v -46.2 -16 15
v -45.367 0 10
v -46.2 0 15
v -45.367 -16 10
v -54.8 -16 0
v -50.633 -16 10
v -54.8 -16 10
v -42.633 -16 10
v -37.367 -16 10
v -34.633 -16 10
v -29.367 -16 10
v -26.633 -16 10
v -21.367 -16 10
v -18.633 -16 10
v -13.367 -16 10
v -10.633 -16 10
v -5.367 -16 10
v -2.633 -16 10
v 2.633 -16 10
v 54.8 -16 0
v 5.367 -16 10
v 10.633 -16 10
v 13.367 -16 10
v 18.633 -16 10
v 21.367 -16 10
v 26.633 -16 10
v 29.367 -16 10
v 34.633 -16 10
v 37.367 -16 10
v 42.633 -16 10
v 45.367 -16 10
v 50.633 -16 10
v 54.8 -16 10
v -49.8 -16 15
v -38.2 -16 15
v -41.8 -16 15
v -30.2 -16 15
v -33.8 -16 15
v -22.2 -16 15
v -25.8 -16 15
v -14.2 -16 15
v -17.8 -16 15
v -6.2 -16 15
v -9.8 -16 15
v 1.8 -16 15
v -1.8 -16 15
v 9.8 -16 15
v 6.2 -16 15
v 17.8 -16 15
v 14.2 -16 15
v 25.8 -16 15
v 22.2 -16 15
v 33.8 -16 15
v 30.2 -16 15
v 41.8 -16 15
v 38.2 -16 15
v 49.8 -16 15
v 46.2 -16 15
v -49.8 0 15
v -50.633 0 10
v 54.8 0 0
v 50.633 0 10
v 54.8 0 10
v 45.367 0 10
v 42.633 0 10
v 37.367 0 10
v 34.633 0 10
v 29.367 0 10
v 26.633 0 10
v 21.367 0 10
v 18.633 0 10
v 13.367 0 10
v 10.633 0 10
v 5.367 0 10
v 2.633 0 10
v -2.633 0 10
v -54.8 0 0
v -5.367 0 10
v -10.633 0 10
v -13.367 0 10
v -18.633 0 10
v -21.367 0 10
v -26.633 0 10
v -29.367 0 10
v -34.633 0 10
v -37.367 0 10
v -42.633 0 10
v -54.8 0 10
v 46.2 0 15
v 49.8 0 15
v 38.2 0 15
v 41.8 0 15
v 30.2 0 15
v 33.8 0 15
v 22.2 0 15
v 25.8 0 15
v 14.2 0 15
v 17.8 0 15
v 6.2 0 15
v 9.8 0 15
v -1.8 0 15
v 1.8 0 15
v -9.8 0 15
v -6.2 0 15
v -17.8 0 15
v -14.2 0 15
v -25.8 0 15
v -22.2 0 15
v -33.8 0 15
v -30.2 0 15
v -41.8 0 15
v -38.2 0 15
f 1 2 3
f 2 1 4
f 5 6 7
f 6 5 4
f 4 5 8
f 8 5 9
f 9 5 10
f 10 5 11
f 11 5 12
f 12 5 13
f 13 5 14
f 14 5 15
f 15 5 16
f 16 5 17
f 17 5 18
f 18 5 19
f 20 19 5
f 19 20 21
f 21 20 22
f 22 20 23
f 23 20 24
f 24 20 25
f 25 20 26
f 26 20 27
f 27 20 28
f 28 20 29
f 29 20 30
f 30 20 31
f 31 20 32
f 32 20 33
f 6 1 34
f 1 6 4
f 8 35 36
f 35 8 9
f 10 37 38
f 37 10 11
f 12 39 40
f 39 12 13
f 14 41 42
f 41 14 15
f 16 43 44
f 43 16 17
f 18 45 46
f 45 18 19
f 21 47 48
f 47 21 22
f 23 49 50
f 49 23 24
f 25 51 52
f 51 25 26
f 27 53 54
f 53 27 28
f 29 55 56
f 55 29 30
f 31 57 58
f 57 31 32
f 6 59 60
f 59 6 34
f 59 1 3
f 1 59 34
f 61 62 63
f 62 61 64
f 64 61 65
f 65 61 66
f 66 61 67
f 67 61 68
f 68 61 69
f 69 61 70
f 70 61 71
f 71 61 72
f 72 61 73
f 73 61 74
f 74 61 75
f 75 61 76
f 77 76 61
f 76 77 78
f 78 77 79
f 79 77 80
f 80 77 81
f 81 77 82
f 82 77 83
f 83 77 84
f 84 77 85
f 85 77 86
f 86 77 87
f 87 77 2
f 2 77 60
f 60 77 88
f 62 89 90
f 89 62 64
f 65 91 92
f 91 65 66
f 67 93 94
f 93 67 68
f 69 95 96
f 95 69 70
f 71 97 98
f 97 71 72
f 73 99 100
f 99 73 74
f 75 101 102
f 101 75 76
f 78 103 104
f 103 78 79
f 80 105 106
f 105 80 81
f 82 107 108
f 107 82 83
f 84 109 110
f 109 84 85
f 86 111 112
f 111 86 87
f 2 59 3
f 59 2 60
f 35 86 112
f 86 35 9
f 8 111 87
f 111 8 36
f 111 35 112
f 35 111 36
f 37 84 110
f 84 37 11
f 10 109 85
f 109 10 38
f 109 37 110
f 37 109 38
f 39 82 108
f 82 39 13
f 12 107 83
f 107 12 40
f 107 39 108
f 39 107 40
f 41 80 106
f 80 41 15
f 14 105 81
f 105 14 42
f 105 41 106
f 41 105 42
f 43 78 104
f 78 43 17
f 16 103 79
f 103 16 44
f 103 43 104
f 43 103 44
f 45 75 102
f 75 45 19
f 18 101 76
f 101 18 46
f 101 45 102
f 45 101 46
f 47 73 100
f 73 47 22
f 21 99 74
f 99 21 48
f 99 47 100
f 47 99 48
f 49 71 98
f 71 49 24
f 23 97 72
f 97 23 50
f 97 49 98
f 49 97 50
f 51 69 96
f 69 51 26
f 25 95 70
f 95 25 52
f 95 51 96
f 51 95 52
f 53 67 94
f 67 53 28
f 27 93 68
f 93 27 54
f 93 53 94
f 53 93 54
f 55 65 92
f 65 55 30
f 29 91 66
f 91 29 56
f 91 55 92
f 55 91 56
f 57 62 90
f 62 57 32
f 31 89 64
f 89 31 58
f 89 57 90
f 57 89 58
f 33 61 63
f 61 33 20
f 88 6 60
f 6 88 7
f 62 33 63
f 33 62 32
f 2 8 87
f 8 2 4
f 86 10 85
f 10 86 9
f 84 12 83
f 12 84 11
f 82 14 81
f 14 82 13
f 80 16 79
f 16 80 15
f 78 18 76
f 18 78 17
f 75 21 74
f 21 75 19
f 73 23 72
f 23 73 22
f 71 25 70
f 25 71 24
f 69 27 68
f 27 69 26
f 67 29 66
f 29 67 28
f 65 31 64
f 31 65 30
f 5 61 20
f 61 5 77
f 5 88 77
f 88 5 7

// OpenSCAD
$fn = 32;

// ----------------------------------------------------------------------
// Toothed rack, 13 teeth
// 8 mm pitch, 5 mm teeth
// ----------------------------------------------------------------------

// --- parameters (mm) ---
bar_w = 16;     // bar width (Y)
bar_h = 10;     // bar height (Z)
teeth = 13;     // number of teeth
pitch = 8;      // tooth pitch
tooth_h = 5;    // tooth height above the bar
root_w = 5.6;   // tooth width at the root
crest_w = 3.6;  // tooth width at the crest

// --- derived feature positions (mm) ---
span = (teeth - 1) * pitch;  // = 96   distance between the outer teeth
bar_l = span + root_w + 8;   // = 109.6   bar length: teeth plus 4 mm at each end
tooth_x = -span / 2;         // = -48   X of the first tooth
height = bar_h + tooth_h;    // = 15   overall height
feature_centers = [
  [tooth_x + 0 * pitch, -bar_w / 2],
  [tooth_x + 1 * pitch, -bar_w / 2],
  [tooth_x + 2 * pitch, -bar_w / 2],
  [tooth_x + 3 * pitch, -bar_w / 2],
  [tooth_x + 4 * pitch, -bar_w / 2],
  [tooth_x + 5 * pitch, -bar_w / 2],
  [tooth_x + 6 * pitch, -bar_w / 2],
  [tooth_x + 7 * pitch, -bar_w / 2],
  [tooth_x + 8 * pitch, -bar_w / 2],
  [tooth_x + 9 * pitch, -bar_w / 2],
  [tooth_x + 10 * pitch, -bar_w / 2],
  [tooth_x + 11 * pitch, -bar_w / 2],
  [tooth_x + 12 * pitch, -bar_w / 2]
];   // tooth centre line, drives the tooth loop

// bar with a rack of teeth, one extruded trapezoium per centre
module rack_tooth() {
  linear_extrude(height = bar_w)
    polygon(points = [
      [0, 0],
      [root_w, 0],
      [root_w / 2 + crest_w / 2, tooth_h + 1],
      [root_w / 2 - crest_w / 2, tooth_h + 1]
    ]);
}

union() {
  translate([-bar_l / 2, -bar_w, 0]) cube([bar_l, bar_w, bar_h]);
  for (centre = feature_centers)
    translate([centre[0] - root_w / 2, 0, bar_h - 1]) rotate([90, 0, 0]) rack_tooth();
}
